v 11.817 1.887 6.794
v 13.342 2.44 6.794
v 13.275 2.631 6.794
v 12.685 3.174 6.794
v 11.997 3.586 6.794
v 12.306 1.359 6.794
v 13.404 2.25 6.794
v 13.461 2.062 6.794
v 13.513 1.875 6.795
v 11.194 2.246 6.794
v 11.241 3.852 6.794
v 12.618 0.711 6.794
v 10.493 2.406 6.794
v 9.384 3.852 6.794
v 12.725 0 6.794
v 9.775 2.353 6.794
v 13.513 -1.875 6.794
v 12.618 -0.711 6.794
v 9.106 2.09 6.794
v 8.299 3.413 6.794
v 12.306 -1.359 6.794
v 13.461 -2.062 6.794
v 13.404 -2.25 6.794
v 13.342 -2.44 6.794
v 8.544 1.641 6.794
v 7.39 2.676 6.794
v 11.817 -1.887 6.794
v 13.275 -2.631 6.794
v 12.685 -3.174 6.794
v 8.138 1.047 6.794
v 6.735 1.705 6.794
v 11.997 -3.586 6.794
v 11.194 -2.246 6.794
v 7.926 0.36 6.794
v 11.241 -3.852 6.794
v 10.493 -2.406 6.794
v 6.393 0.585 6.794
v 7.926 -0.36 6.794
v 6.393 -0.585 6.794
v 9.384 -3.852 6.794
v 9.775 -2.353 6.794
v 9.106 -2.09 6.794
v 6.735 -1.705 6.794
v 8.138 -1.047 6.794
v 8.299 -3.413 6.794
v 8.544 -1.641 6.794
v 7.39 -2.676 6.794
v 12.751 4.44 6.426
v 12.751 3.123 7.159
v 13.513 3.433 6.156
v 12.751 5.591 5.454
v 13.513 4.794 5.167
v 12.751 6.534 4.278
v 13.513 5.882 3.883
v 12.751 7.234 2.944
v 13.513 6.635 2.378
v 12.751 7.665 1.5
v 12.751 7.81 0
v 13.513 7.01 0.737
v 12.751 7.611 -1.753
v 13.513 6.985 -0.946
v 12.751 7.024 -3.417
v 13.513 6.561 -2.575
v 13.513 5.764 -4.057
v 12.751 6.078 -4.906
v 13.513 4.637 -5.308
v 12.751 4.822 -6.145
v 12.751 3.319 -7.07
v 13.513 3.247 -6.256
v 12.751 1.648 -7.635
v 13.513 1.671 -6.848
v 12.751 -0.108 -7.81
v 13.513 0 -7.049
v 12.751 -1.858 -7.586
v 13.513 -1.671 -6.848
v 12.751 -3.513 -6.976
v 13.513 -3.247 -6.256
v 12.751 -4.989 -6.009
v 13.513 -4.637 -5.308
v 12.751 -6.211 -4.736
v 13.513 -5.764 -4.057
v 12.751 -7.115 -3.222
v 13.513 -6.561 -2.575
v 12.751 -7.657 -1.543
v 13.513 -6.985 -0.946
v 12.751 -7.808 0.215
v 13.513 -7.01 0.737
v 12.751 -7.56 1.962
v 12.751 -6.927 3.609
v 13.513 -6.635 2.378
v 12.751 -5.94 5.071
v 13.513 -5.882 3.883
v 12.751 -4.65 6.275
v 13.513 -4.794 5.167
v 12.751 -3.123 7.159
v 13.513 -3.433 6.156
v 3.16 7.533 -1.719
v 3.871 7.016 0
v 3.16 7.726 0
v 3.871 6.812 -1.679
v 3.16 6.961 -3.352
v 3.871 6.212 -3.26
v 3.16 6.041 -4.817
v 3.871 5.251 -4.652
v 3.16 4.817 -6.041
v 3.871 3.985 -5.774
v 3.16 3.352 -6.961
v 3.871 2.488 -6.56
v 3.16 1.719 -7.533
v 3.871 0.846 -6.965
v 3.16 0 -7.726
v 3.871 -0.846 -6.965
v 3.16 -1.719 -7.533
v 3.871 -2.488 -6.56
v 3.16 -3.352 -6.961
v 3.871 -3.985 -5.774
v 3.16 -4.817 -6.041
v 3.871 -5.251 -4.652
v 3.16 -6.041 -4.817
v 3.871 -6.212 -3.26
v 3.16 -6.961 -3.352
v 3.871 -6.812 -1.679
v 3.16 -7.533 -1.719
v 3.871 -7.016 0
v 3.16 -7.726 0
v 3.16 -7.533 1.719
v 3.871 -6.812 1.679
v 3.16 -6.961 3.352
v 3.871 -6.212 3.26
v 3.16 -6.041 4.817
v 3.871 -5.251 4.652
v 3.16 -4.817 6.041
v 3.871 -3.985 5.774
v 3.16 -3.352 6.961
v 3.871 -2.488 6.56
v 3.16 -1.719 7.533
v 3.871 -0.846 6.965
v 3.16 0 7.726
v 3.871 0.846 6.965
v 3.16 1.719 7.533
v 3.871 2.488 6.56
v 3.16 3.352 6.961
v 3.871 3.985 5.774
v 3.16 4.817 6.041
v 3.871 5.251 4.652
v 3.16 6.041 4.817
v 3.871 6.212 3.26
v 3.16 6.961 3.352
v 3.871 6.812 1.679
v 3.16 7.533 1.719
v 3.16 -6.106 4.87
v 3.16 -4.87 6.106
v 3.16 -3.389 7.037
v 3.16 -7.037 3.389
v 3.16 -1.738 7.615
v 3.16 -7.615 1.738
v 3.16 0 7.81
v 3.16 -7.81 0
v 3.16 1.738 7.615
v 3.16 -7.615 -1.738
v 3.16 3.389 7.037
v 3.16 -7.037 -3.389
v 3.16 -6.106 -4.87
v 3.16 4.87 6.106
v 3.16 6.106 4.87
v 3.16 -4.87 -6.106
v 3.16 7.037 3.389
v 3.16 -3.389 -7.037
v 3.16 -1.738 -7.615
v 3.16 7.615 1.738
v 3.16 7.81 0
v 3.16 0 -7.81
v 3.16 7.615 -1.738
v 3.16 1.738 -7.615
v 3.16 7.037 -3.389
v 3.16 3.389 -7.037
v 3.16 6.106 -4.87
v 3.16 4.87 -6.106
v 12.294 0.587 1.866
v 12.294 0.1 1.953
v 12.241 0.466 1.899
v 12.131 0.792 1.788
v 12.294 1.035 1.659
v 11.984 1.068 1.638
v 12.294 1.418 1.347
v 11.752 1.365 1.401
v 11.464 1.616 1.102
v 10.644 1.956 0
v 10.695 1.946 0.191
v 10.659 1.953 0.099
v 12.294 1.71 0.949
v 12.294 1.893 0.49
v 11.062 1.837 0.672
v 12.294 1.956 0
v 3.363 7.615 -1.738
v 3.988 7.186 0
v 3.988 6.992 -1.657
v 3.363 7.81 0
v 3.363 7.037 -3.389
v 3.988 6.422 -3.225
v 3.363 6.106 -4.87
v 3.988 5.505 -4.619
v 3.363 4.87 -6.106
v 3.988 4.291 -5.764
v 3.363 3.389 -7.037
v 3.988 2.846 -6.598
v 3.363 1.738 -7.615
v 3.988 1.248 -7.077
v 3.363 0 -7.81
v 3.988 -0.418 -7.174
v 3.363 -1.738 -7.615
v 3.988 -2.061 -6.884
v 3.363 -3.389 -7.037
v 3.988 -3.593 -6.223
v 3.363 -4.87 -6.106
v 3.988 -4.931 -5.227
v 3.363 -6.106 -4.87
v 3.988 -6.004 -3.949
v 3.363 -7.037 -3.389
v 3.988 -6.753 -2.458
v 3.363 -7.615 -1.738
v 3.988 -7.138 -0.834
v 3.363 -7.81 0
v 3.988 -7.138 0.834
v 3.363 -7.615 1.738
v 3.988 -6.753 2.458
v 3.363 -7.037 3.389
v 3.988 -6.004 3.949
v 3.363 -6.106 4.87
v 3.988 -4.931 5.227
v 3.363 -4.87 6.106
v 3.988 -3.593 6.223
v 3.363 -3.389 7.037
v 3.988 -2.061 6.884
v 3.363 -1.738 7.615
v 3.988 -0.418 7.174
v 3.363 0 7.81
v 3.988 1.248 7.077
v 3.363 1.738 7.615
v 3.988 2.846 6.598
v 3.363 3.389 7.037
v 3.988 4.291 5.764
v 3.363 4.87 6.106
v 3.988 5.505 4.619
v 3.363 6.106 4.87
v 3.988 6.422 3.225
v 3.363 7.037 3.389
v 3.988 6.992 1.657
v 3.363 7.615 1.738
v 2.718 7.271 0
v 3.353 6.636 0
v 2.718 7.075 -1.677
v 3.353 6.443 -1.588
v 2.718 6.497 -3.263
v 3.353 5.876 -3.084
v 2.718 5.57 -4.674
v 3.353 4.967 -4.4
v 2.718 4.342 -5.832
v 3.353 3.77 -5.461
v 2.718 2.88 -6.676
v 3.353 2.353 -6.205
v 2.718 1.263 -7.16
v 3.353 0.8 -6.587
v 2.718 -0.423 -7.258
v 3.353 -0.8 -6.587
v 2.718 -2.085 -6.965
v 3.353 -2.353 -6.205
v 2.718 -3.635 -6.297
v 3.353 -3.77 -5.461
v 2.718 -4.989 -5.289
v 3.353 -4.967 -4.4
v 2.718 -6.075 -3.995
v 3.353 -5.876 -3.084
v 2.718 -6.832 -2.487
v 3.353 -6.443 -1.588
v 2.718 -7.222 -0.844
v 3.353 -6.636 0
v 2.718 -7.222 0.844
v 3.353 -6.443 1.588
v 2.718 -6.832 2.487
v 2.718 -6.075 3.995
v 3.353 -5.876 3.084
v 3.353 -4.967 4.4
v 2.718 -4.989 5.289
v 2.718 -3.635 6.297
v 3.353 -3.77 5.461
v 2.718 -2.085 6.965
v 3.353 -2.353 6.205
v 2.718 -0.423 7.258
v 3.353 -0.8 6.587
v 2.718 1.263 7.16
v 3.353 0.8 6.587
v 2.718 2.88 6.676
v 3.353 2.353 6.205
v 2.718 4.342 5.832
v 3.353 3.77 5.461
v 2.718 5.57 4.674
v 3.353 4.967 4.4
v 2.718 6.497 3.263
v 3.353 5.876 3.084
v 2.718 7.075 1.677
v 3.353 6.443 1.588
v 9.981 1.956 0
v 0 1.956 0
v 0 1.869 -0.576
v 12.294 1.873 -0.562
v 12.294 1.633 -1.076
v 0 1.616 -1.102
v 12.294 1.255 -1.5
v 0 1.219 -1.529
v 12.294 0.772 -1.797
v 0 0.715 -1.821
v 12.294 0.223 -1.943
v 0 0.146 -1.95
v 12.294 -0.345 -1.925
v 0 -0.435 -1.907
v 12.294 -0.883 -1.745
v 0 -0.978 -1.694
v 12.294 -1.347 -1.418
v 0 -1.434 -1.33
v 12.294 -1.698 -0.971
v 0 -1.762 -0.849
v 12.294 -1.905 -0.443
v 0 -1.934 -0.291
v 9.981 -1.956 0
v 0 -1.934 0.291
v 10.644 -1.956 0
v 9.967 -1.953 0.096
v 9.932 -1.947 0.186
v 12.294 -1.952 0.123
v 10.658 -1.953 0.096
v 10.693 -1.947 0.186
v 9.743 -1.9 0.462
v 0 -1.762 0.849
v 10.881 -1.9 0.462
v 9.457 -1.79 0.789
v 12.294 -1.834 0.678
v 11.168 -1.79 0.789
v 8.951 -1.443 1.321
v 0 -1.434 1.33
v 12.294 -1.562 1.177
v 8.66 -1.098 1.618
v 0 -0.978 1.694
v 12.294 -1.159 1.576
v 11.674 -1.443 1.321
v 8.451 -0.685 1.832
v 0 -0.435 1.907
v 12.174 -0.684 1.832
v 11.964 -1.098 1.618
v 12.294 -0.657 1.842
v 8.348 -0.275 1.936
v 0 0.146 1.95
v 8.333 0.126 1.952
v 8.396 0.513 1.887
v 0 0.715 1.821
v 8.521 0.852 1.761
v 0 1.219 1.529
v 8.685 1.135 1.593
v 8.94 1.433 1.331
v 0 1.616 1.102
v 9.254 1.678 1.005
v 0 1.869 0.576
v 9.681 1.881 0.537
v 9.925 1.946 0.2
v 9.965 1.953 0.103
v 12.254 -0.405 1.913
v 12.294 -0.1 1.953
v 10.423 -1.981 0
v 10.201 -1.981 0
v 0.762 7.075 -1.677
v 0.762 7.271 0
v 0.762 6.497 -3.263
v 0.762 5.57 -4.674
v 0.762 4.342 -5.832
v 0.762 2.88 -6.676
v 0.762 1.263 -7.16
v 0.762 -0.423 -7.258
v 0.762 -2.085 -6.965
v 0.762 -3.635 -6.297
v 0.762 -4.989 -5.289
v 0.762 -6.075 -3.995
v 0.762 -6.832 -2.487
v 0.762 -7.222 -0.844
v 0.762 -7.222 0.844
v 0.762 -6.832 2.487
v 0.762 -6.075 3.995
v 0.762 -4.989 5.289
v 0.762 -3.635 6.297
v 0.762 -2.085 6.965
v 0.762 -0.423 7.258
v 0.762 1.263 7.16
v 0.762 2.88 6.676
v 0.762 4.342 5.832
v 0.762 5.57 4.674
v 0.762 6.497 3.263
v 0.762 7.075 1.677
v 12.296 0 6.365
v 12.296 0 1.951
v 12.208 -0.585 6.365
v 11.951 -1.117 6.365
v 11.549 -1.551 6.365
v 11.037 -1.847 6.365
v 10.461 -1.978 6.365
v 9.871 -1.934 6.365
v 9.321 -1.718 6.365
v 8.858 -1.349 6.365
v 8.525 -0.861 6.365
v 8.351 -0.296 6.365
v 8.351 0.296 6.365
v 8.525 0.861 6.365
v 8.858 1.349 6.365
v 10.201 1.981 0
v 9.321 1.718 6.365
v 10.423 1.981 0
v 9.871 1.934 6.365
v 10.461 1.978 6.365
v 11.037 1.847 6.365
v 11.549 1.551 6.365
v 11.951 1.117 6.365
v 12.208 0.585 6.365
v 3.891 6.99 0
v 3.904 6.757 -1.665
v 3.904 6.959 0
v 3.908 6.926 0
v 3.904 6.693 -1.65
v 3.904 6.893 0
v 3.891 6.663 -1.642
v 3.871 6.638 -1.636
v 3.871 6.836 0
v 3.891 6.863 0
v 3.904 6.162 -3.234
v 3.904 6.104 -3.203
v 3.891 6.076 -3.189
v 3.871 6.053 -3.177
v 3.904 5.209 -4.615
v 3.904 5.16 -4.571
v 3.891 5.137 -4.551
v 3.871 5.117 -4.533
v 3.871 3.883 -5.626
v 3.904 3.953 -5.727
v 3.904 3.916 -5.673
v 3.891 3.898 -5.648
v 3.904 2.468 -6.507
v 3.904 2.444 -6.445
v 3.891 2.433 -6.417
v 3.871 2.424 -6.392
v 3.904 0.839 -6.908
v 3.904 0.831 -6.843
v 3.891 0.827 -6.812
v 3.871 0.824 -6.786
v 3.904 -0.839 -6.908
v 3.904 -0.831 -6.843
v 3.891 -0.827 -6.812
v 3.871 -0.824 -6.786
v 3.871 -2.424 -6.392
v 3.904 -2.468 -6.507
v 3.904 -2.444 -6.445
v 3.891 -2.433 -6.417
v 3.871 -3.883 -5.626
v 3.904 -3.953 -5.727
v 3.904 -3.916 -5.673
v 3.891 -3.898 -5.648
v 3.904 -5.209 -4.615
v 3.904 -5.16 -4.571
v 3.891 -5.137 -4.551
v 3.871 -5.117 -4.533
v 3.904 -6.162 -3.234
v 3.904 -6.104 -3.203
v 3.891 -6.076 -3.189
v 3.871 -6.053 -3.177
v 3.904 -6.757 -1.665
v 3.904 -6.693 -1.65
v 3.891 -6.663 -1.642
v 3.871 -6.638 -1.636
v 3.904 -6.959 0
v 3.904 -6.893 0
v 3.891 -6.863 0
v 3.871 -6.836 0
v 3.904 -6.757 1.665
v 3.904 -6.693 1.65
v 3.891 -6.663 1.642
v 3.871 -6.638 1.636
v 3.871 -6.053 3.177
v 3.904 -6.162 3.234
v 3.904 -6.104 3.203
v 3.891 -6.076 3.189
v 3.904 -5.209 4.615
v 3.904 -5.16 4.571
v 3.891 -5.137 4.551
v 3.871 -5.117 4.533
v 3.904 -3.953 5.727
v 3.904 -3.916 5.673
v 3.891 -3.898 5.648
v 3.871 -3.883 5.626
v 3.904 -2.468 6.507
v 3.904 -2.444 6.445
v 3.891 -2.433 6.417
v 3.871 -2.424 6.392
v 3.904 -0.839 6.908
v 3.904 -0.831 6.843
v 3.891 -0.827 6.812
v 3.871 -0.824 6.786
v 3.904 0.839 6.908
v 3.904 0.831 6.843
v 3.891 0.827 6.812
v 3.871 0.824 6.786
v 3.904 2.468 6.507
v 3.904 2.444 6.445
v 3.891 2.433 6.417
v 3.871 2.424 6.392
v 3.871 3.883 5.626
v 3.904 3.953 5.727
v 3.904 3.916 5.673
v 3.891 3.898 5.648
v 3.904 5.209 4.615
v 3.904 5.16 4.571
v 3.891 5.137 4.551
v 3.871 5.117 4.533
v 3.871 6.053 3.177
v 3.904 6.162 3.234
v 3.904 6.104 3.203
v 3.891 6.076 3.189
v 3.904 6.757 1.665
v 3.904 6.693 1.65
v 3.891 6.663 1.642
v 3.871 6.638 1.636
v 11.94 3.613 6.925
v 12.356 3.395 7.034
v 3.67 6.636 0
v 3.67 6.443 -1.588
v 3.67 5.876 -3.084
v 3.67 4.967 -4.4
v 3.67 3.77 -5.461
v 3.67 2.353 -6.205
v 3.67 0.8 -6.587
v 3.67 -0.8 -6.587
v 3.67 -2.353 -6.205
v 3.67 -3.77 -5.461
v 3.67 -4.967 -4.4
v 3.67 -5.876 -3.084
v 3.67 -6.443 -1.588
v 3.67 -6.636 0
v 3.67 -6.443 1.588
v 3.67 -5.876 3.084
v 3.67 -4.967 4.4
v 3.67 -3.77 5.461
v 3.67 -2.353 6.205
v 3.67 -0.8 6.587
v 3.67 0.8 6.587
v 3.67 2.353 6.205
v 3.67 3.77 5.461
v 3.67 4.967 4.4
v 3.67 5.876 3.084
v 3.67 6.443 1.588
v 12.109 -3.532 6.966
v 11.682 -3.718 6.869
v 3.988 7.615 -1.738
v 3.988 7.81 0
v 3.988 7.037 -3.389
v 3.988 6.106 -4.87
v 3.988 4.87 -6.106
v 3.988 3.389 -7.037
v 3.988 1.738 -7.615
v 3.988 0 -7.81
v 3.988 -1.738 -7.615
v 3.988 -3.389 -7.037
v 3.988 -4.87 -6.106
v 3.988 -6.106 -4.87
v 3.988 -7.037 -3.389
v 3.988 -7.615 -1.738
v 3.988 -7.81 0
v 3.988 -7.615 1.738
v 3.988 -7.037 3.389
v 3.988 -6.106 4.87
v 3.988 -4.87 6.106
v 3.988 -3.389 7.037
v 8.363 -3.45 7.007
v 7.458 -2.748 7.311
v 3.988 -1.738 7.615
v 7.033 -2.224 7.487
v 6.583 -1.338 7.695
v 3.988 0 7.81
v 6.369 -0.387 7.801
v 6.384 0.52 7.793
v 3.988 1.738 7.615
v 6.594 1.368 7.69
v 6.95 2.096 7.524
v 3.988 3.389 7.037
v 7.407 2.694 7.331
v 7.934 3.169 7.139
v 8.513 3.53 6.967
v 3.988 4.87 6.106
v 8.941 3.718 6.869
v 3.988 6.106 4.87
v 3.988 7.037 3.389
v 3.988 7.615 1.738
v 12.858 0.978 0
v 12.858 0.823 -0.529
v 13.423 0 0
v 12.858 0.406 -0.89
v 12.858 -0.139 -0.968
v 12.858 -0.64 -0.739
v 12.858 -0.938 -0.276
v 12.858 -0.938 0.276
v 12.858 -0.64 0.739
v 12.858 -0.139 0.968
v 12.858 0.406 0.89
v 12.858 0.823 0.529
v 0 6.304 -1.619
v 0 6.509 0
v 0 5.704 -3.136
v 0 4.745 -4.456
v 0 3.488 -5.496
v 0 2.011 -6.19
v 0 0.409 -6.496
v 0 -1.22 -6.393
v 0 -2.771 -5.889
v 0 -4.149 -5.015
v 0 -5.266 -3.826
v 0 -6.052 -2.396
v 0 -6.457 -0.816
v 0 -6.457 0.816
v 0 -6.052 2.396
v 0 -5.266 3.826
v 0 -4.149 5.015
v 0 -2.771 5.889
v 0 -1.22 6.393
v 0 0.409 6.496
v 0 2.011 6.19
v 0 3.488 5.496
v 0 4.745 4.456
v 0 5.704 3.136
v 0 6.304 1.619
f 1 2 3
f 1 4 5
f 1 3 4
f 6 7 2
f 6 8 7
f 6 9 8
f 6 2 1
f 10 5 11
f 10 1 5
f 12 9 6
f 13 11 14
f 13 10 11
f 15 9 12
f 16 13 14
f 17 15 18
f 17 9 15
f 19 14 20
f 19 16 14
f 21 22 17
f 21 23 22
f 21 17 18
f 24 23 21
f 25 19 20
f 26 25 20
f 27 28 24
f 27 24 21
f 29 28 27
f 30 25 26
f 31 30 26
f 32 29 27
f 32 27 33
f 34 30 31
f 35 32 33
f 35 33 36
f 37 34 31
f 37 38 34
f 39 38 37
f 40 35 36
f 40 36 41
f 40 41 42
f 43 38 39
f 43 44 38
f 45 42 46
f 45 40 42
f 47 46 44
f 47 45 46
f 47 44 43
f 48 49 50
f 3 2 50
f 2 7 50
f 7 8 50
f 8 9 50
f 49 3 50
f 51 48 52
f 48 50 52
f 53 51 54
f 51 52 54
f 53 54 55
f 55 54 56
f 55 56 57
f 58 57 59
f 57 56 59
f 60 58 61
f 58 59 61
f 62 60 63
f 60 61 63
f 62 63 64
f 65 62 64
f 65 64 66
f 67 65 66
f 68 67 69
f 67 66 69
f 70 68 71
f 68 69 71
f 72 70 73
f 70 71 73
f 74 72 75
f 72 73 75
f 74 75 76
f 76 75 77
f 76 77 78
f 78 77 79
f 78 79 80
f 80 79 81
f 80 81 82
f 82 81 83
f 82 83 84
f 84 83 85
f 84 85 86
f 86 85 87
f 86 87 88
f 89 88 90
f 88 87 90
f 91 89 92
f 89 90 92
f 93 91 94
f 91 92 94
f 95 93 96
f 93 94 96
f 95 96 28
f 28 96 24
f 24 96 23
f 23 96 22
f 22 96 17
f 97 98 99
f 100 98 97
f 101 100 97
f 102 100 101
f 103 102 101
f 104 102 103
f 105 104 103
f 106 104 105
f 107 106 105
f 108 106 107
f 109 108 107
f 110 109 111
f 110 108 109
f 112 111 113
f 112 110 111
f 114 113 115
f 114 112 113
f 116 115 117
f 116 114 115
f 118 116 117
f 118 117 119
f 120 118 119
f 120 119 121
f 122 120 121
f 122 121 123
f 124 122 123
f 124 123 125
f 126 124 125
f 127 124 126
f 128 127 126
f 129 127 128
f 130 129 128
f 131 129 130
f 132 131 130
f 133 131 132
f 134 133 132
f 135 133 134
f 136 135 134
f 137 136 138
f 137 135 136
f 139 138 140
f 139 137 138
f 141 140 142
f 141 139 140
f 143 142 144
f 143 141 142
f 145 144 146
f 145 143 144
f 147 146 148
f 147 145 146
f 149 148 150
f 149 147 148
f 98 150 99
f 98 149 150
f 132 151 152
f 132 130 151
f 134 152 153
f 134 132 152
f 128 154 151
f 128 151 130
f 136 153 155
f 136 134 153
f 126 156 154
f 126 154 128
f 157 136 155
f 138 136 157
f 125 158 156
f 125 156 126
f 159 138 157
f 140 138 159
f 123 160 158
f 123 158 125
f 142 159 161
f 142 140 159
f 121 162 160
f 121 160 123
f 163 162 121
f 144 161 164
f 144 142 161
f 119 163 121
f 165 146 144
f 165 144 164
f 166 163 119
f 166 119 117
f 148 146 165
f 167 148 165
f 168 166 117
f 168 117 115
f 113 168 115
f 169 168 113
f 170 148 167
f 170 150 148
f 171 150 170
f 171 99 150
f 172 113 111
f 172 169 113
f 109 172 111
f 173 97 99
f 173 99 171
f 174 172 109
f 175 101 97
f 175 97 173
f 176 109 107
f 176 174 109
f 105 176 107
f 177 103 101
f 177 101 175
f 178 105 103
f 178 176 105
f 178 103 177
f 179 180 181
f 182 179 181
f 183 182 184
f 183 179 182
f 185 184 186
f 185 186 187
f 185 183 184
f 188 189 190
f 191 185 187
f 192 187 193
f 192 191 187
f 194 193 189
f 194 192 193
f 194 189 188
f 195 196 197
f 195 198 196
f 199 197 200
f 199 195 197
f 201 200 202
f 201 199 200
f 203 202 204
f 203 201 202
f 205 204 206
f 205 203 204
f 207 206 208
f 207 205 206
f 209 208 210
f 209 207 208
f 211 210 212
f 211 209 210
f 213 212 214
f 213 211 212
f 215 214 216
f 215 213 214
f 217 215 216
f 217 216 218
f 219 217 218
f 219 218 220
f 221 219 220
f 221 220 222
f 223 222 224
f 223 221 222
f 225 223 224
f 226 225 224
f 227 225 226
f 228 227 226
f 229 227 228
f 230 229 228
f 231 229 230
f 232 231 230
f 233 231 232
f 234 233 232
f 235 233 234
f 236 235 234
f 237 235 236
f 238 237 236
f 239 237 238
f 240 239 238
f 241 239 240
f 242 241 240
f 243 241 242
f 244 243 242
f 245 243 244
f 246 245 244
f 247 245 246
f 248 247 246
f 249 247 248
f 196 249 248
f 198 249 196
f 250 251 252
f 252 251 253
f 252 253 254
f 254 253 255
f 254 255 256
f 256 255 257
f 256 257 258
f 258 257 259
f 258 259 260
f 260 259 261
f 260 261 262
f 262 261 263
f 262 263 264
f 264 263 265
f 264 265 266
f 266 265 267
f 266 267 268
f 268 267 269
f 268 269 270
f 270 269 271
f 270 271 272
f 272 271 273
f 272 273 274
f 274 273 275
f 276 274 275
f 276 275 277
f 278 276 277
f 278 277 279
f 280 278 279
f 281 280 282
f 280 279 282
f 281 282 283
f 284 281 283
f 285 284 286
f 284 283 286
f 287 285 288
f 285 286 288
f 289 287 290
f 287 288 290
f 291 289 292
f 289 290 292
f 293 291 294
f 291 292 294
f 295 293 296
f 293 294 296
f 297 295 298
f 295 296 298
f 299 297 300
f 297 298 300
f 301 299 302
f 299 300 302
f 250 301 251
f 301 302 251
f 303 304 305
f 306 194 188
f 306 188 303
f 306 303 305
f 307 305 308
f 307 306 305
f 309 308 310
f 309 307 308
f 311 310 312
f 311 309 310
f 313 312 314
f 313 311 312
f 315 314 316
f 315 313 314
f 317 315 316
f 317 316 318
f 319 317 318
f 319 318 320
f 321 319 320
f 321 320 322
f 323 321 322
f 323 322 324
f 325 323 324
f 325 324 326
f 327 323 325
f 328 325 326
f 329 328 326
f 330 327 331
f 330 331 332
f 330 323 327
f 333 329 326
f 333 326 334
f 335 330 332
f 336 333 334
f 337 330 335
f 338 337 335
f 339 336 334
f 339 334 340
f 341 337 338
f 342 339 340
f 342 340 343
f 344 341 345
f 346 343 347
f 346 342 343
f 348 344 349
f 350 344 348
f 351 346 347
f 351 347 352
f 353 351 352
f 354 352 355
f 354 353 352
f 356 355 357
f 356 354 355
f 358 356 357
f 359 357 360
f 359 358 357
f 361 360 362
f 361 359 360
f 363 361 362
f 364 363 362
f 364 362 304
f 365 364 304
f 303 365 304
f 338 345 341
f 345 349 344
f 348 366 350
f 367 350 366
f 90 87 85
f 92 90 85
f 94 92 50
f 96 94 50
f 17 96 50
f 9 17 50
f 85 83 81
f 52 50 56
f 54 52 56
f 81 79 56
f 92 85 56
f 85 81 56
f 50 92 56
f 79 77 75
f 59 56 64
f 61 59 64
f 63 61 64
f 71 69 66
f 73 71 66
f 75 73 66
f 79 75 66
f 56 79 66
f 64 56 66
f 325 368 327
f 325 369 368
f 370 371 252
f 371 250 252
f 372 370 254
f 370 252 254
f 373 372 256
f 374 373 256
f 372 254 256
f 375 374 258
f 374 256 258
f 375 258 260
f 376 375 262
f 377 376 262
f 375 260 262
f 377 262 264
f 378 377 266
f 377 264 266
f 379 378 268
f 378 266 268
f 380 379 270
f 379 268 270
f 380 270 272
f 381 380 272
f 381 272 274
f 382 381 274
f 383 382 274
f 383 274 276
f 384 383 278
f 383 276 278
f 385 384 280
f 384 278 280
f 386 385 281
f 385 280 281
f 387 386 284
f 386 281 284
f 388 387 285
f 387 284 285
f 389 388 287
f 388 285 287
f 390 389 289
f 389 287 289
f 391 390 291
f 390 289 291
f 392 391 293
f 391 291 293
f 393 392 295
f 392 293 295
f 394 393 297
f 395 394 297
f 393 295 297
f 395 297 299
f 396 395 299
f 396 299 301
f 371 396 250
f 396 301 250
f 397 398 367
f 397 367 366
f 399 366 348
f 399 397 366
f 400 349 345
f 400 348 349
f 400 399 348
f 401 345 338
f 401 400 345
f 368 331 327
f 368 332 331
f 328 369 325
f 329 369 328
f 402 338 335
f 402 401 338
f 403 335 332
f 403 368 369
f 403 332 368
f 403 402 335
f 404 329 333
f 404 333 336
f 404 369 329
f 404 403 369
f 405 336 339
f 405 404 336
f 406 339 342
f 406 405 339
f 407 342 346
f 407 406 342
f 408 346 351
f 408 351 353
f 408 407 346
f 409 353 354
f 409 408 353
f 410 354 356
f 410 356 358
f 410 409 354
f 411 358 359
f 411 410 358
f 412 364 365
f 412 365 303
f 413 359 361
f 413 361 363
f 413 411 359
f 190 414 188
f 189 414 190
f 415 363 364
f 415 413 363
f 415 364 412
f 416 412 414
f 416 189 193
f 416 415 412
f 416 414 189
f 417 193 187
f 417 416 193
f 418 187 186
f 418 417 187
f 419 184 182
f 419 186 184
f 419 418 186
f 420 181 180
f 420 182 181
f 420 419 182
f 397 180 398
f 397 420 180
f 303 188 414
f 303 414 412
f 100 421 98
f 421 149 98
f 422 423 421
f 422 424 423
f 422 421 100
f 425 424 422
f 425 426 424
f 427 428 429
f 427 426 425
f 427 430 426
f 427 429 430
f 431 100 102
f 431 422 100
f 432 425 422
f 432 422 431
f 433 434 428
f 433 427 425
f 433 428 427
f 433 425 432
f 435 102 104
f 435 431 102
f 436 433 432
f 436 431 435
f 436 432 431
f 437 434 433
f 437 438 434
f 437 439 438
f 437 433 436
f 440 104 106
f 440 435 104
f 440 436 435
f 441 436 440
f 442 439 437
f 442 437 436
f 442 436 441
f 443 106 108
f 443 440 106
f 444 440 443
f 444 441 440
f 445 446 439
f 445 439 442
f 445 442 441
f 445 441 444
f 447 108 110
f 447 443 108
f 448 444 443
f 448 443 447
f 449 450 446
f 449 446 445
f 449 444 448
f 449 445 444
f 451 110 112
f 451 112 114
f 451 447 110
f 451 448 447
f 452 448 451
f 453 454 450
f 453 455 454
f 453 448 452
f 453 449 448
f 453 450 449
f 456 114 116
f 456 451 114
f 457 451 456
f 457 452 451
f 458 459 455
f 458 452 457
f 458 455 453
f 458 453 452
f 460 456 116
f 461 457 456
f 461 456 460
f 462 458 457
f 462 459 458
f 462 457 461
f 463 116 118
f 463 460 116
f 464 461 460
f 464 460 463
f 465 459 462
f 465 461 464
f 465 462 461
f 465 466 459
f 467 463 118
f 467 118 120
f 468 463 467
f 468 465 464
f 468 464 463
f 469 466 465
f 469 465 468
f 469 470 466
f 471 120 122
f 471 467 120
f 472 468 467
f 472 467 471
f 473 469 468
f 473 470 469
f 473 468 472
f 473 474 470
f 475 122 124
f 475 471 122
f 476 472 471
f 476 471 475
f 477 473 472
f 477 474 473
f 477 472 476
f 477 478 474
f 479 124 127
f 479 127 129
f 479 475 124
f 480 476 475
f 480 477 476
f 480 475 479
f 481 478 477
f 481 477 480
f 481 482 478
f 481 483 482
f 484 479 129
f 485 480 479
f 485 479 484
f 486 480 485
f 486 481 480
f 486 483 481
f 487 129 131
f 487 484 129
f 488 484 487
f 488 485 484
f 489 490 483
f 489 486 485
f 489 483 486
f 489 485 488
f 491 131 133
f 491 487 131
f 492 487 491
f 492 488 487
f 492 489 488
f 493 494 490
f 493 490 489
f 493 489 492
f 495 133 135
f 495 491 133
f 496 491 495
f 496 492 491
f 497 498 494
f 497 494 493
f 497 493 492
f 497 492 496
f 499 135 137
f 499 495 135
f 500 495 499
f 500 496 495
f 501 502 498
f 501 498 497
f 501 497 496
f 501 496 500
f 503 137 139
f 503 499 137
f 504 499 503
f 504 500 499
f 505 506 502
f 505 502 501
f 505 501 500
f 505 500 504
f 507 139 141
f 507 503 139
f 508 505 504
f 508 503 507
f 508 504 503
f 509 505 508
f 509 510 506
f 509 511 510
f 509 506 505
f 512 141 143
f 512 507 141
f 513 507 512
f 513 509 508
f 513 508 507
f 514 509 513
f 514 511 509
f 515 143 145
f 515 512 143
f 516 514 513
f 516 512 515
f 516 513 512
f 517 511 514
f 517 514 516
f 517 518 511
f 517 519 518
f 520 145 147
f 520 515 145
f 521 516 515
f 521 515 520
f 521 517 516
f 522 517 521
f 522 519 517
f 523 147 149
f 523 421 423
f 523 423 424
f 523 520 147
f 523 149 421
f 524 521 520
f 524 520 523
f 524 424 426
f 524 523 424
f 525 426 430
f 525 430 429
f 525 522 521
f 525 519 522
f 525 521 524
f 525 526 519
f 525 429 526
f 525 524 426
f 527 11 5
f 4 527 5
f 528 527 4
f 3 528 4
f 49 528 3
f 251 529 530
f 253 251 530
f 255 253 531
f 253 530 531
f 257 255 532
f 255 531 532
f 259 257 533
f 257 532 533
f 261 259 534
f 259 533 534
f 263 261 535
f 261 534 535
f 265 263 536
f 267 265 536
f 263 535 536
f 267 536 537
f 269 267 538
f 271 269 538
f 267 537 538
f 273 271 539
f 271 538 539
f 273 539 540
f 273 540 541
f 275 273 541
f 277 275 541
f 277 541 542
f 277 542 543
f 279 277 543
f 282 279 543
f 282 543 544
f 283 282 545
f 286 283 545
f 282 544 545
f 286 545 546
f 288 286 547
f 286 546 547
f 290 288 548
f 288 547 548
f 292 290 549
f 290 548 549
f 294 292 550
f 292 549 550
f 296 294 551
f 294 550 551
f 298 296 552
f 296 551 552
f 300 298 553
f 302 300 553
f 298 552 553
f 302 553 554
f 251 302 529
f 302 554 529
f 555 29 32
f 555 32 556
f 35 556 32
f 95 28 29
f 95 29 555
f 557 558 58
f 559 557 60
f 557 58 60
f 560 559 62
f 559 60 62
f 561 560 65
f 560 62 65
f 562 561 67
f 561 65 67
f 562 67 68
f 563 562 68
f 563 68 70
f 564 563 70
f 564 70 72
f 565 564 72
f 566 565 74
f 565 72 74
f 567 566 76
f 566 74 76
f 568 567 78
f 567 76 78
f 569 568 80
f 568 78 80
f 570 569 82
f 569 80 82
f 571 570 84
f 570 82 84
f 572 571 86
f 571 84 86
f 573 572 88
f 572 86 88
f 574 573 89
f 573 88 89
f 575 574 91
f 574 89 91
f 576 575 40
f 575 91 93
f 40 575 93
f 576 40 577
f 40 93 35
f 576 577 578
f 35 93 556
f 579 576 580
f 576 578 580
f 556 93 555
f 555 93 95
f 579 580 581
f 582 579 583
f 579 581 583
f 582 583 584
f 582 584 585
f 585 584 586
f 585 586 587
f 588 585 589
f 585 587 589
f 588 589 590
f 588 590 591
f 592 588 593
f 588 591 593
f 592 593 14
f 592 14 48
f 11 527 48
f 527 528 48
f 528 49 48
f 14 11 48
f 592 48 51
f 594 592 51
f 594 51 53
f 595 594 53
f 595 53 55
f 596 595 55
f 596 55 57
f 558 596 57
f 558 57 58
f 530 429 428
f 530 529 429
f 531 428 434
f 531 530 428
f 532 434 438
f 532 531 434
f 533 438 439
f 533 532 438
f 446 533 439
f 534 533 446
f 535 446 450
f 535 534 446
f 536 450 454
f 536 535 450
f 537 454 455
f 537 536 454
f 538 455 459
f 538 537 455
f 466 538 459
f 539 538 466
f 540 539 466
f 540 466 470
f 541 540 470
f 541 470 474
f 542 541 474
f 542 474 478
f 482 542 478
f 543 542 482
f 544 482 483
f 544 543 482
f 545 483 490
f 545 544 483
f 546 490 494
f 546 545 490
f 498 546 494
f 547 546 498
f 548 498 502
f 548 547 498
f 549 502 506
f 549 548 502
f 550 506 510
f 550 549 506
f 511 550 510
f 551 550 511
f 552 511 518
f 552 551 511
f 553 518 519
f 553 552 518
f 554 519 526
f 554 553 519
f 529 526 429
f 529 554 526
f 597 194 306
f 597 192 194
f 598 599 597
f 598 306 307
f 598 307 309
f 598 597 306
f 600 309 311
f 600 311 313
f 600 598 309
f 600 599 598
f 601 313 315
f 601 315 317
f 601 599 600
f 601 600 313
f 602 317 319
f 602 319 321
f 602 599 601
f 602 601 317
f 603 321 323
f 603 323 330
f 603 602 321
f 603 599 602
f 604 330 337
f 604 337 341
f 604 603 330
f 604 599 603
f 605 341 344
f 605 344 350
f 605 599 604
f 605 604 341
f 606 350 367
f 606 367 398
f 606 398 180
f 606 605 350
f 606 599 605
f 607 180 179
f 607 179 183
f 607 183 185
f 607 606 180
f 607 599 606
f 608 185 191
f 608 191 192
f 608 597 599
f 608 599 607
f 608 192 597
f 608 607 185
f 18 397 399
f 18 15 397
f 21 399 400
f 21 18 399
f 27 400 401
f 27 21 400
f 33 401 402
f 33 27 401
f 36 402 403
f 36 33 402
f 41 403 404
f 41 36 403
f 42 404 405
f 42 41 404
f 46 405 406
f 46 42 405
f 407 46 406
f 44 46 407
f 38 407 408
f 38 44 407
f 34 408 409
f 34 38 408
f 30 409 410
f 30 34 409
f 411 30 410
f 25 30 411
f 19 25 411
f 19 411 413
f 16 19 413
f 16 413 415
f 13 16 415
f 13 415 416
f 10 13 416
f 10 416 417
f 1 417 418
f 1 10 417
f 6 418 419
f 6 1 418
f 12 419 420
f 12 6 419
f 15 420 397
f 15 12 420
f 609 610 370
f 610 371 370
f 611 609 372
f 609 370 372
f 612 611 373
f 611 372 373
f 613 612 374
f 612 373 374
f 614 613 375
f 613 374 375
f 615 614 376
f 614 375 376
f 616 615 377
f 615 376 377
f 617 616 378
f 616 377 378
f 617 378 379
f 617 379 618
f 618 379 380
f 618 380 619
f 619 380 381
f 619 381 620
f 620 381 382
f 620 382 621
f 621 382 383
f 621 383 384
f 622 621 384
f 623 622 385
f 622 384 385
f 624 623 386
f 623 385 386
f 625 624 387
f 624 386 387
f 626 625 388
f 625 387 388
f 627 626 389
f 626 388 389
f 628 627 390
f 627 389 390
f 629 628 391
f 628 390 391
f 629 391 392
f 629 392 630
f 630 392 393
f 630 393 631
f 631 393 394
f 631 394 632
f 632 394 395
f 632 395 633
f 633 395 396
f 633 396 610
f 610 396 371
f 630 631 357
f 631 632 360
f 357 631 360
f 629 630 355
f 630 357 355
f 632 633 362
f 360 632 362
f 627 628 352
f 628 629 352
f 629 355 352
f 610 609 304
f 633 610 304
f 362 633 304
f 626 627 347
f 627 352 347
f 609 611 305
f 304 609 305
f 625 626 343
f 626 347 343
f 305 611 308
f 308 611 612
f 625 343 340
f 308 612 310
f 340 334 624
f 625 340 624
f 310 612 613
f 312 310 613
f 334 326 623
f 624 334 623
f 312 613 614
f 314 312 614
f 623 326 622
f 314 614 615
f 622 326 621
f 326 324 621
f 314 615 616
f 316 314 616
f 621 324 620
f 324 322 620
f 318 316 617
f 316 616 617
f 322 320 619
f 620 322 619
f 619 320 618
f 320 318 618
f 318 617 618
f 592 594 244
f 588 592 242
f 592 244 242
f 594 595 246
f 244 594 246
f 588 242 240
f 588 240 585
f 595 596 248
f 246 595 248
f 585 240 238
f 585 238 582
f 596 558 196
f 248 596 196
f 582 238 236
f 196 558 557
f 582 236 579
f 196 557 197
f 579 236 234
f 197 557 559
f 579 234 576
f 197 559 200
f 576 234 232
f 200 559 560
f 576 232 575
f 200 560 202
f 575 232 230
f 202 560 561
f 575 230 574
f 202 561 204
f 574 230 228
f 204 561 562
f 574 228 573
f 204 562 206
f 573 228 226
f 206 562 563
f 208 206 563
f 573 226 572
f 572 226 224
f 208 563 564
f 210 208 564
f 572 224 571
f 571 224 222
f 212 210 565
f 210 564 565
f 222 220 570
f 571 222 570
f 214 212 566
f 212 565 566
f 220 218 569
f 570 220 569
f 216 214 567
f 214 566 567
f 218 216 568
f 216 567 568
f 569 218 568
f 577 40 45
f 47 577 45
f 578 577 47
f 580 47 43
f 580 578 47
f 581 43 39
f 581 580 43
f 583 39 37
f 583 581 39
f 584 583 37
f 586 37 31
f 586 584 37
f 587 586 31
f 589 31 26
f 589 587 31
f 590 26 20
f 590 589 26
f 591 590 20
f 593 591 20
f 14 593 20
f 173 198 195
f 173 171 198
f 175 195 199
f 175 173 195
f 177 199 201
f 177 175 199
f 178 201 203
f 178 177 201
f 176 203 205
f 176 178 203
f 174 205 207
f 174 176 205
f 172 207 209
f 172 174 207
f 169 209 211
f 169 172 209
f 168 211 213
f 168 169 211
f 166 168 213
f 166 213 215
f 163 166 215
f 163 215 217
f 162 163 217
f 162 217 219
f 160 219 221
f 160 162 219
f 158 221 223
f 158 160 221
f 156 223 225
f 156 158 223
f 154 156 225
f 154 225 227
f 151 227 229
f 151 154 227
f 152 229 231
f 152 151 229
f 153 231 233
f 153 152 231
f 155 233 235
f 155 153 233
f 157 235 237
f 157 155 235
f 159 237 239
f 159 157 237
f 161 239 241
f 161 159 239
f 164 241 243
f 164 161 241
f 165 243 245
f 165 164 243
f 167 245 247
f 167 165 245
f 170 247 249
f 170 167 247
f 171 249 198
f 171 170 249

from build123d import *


with BuildPart() as part:
    # Sketch1 → Revolve1 (revolve)
    with BuildSketch(Plane.XY):
        Polygon((0, 0), (0, 6.50875), (0.762, 7.27075), (2.7178, 7.27075), (3.3528, 6.63575), (3.9878, 6.63575), (3.9878, 7.8105), (12.7508, 7.8105), (13.5128, 7.0485), (13.5128, 0), align=None)
    revolve(axis=Axis((13.5128, 0, 0), (-1, 0, 0)))

    # Sketch2 → Cut-Revolve1 (revolve, cut)
    with BuildSketch(Plane.XY):
        Polygon((0, 0), (0, 1.9558), (12.2936, 1.9558), (13.422781656, 0), align=None)
    revolve(axis=Axis((13.422781656, 0, 0), (-1, 0, 0)), mode=Mode.SUBTRACT)

    # Sketch3 → Cut-Revolve2 (revolve, cut)
    with BuildSketch(Plane(origin=(0, 0, 0), x_dir=(1, 0, 0), z_dir=(0, 1, 0))):
        Polygon((10.3124, 0), (12.29614, 0), (12.29614, -6.36524), (12.7254, -6.7945), (14.2748, -6.7945), (14.2748, -7.8105), (10.3124, -7.8105), align=None)
    revolve(axis=Axis((10.3124, 0, 7.8105), (0, 0, -1)), mode=Mode.SUBTRACT)

    # Sketch4 → Revolve2 (revolve)
    with BuildSketch(Plane.XY):
        with BuildLine():
            Line((3.160243808, 7.8105), (3.160243808, 7.726331804))
            Line((3.160243808, 7.726331804), (3.870760245, 7.015815367))
            ThreePointArc((3.870760245, 7.015815367), (3.907957684, 6.926012806), (3.870760245, 6.836210245))
            Line((3.870760245, 6.836210245), (3.6703, 6.63575))
            Line((3.6703, 6.63575), (3.3528, 6.63575))
            Line((3.3528, 6.63575), (3.3528, 6.38175))
            Line((3.3528, 6.38175), (3.9878, 6.38175))
            Line((3.9878, 6.38175), (3.9878, 7.186143808))
            Line((3.9878, 7.186143808), (3.363443808, 7.8105))
            Line((3.363443808, 7.8105), (3.160243808, 7.8105))
        make_face()
    revolve(axis=Axis((3.9878, 0, 0), (-1, 0, 0)))


solid = part.part
